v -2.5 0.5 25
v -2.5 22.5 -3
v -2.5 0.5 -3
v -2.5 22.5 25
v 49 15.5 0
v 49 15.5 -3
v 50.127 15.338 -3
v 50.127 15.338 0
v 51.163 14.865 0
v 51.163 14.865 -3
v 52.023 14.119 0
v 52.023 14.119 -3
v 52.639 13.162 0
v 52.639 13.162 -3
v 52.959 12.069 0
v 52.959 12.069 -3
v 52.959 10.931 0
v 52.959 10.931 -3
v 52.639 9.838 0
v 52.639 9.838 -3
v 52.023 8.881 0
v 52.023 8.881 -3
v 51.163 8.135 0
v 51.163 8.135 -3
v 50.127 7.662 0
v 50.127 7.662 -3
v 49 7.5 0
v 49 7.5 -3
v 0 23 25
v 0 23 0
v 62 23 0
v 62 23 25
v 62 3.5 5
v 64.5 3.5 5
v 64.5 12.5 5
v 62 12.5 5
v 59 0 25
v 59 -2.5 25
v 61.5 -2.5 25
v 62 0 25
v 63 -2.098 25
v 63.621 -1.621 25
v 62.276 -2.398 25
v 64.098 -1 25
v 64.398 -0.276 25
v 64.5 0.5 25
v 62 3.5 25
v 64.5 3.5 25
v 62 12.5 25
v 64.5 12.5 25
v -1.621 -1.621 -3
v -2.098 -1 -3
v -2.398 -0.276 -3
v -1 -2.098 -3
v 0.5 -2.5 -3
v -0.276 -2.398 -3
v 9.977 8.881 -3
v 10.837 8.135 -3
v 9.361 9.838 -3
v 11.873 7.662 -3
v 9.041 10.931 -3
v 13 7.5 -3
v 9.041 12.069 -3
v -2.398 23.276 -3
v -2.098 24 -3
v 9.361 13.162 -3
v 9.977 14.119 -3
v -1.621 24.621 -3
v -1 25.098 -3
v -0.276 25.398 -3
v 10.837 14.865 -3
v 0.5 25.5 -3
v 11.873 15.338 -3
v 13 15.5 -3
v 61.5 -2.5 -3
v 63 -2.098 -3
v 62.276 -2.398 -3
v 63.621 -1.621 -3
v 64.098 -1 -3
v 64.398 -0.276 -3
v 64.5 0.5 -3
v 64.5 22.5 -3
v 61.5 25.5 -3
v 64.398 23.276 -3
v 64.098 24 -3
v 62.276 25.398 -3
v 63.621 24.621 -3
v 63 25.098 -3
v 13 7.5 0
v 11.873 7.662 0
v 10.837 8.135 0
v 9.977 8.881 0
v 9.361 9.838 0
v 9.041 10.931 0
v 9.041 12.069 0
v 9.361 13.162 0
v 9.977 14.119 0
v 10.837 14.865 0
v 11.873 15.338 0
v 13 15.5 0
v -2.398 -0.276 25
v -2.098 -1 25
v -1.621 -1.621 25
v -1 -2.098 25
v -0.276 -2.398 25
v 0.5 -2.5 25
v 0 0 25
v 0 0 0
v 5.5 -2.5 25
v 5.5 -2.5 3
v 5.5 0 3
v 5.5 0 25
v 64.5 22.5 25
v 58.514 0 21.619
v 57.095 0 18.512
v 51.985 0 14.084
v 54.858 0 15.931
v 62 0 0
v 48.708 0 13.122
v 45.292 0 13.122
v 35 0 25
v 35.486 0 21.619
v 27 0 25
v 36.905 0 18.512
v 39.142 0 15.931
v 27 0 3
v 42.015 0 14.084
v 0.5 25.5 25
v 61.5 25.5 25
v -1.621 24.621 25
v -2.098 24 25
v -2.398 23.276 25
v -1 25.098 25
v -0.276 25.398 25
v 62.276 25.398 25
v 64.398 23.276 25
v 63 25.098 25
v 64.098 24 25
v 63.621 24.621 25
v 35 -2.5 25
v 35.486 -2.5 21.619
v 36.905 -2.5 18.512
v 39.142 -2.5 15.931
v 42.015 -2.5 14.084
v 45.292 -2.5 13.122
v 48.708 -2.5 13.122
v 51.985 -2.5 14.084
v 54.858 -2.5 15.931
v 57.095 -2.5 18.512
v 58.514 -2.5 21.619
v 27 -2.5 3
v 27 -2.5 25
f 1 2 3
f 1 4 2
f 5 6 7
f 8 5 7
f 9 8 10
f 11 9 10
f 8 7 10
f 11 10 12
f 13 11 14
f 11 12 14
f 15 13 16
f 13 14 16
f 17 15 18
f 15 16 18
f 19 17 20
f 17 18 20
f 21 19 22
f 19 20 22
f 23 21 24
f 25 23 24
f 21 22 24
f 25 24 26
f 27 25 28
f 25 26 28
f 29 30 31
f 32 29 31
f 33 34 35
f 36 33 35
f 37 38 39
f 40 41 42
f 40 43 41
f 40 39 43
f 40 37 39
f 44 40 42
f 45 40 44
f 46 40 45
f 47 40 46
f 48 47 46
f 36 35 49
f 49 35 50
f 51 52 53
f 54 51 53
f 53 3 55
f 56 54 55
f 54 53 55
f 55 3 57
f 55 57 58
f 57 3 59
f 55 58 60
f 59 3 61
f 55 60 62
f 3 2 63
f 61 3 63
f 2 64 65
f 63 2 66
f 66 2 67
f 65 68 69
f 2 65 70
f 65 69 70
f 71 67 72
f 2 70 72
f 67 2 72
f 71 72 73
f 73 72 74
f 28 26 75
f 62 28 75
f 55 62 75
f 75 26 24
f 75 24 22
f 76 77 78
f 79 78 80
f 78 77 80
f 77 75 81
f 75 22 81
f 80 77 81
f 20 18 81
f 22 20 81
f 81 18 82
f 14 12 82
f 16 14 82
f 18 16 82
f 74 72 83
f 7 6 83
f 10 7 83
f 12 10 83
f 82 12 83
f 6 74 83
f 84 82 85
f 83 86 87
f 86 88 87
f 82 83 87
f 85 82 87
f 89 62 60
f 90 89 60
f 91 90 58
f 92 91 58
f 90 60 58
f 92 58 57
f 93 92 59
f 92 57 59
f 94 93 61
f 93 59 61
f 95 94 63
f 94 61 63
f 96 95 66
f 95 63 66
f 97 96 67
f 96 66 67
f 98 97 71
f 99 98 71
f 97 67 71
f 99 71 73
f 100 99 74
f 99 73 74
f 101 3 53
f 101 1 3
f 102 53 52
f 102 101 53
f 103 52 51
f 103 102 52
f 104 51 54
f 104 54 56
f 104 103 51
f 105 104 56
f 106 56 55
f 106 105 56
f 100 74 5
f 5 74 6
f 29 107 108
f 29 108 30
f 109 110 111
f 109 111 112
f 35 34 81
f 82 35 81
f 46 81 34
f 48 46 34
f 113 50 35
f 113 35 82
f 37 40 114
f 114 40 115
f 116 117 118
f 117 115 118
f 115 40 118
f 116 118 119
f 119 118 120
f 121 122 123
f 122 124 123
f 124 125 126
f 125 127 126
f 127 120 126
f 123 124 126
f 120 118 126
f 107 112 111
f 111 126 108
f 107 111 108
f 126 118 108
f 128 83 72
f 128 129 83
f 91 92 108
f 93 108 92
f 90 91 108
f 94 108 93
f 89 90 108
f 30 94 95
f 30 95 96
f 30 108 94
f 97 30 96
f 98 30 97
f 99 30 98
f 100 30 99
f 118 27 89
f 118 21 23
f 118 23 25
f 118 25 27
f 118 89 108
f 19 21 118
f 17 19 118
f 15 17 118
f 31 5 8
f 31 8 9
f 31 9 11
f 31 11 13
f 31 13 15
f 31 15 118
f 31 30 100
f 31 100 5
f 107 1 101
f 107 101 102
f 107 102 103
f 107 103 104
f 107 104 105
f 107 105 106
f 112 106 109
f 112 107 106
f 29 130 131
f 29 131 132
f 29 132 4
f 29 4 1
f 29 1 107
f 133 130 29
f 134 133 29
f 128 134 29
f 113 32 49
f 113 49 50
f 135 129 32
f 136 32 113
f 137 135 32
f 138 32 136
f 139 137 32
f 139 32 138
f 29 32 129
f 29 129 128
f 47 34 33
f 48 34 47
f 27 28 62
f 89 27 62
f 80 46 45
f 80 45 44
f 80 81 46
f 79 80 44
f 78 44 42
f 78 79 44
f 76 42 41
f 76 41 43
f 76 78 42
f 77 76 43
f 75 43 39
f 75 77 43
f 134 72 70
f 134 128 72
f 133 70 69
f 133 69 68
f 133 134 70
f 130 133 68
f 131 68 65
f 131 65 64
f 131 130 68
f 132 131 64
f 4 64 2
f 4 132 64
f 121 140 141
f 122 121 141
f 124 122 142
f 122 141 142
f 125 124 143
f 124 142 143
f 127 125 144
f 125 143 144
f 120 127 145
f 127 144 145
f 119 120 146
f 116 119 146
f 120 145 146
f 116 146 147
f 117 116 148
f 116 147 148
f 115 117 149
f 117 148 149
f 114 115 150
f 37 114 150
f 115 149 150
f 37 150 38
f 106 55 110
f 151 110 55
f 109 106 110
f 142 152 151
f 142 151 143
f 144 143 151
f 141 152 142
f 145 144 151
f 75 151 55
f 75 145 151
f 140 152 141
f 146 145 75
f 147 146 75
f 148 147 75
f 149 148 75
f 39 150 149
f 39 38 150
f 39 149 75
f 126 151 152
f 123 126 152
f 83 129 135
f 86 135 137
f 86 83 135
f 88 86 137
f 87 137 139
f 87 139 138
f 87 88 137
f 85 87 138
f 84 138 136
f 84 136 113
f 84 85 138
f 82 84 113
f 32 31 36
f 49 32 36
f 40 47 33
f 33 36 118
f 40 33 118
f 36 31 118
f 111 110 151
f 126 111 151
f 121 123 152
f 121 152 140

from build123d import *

# Parameters (mm, degrees)
F1_DEPTH = 25
F0_W     = 62
F0_H     = 23
F2_DEPTH = 3
F4_DEPTH = 25
F5_W     = 21.5
F5_H     = 22
F6_DEPTH = 3
F7_W     = 9
F7_H     = 20
F8_DEPTH = 5
F9_R     = 3


with BuildPart() as f1:
    # F0 (on Top) → F1 (new body)
    with BuildSketch(Plane.XY):
        Polygon((-2.5, 23), (0, 23), (62, 23), (62, 25.5), (-2.5, 25.5), align=None)
        Polygon((0, -2.5), (0, 0), (0, 23), (-2.5, 23), (-2.5, -2.5), align=None)
        Polygon((62, 0), (0, 0), (0, -2.5), (64.5, -2.5), (64.5, 0), align=None)
        Polygon((62, 23), (62, 0), (64.5, 0), (64.5, 25.5), (62, 25.5), align=None)
    extrude(amount=F1_DEPTH)

    # F0 (on Top) → F2 (join)
    with BuildSketch(Plane.XY):
        Polygon((62, 23), (62, 0), (64.5, 0), (64.5, 25.5), (62, 25.5), align=None)
        with Locations((31, 11.5)):
            Rectangle(F0_W, F0_H)
        Polygon((62, 0), (0, 0), (0, -2.5), (64.5, -2.5), (64.5, 0), align=None)
        Polygon((0, -2.5), (0, 0), (0, 23), (-2.5, 23), (-2.5, -2.5), align=None)
        Polygon((-2.5, 23), (0, 23), (62, 23), (62, 25.5), (-2.5, 25.5), align=None)
    extrude(amount=-F2_DEPTH)

    # F3 (on face) → F4 (cut)
    with BuildSketch(Plane(origin=(0, 0, -3), x_dir=(1, 0, 0), z_dir=(0, 0, -1))):
        with BuildLine():
            Line((49, -7.5), (31, -7.5))
            Line((31, -7.5), (13, -7.5))
            ThreePointArc((13, -7.5), (9, -11.5), (13, -15.5))
            Line((13, -15.5), (31, -15.5))
            Line((31, -15.5), (49, -15.5))
            ThreePointArc((49, -15.5), (53, -11.5), (49, -7.5))
        make_face()
    extrude(amount=-F4_DEPTH, mode=Mode.SUBTRACT)

    # F5 (on face) → F6 (cut)
    with BuildSketch(Plane.XZ.offset(2.5)):
        with Locations((16.25, 14)):
            Rectangle(F5_W, F5_H)
        with BuildLine():
            Line((59, 25), (35, 25))
            ThreePointArc((35, 25), (47, 13), (59, 25))
        make_face()
    extrude(amount=-F6_DEPTH, mode=Mode.SUBTRACT)

    # F7 (on face) → F8 (cut)
    with BuildSketch(Plane.YZ.offset(64.5)):
        with Locations((8, 15)):
            Rectangle(F7_W, F7_H)
    extrude(amount=-F8_DEPTH, mode=Mode.SUBTRACT)

    # F9
    f9_edges = [f1.edges().sort_by_distance(p)[0] for p in [
        (64.5, -2.5, 11),
        (64.5, 25.5, 11),
        (-2.5, 25.5, 11),
        (-2.5, -2.5, 11),
    ]]
    fillet(f9_edges, radius=F9_R)


solid = f1.part
